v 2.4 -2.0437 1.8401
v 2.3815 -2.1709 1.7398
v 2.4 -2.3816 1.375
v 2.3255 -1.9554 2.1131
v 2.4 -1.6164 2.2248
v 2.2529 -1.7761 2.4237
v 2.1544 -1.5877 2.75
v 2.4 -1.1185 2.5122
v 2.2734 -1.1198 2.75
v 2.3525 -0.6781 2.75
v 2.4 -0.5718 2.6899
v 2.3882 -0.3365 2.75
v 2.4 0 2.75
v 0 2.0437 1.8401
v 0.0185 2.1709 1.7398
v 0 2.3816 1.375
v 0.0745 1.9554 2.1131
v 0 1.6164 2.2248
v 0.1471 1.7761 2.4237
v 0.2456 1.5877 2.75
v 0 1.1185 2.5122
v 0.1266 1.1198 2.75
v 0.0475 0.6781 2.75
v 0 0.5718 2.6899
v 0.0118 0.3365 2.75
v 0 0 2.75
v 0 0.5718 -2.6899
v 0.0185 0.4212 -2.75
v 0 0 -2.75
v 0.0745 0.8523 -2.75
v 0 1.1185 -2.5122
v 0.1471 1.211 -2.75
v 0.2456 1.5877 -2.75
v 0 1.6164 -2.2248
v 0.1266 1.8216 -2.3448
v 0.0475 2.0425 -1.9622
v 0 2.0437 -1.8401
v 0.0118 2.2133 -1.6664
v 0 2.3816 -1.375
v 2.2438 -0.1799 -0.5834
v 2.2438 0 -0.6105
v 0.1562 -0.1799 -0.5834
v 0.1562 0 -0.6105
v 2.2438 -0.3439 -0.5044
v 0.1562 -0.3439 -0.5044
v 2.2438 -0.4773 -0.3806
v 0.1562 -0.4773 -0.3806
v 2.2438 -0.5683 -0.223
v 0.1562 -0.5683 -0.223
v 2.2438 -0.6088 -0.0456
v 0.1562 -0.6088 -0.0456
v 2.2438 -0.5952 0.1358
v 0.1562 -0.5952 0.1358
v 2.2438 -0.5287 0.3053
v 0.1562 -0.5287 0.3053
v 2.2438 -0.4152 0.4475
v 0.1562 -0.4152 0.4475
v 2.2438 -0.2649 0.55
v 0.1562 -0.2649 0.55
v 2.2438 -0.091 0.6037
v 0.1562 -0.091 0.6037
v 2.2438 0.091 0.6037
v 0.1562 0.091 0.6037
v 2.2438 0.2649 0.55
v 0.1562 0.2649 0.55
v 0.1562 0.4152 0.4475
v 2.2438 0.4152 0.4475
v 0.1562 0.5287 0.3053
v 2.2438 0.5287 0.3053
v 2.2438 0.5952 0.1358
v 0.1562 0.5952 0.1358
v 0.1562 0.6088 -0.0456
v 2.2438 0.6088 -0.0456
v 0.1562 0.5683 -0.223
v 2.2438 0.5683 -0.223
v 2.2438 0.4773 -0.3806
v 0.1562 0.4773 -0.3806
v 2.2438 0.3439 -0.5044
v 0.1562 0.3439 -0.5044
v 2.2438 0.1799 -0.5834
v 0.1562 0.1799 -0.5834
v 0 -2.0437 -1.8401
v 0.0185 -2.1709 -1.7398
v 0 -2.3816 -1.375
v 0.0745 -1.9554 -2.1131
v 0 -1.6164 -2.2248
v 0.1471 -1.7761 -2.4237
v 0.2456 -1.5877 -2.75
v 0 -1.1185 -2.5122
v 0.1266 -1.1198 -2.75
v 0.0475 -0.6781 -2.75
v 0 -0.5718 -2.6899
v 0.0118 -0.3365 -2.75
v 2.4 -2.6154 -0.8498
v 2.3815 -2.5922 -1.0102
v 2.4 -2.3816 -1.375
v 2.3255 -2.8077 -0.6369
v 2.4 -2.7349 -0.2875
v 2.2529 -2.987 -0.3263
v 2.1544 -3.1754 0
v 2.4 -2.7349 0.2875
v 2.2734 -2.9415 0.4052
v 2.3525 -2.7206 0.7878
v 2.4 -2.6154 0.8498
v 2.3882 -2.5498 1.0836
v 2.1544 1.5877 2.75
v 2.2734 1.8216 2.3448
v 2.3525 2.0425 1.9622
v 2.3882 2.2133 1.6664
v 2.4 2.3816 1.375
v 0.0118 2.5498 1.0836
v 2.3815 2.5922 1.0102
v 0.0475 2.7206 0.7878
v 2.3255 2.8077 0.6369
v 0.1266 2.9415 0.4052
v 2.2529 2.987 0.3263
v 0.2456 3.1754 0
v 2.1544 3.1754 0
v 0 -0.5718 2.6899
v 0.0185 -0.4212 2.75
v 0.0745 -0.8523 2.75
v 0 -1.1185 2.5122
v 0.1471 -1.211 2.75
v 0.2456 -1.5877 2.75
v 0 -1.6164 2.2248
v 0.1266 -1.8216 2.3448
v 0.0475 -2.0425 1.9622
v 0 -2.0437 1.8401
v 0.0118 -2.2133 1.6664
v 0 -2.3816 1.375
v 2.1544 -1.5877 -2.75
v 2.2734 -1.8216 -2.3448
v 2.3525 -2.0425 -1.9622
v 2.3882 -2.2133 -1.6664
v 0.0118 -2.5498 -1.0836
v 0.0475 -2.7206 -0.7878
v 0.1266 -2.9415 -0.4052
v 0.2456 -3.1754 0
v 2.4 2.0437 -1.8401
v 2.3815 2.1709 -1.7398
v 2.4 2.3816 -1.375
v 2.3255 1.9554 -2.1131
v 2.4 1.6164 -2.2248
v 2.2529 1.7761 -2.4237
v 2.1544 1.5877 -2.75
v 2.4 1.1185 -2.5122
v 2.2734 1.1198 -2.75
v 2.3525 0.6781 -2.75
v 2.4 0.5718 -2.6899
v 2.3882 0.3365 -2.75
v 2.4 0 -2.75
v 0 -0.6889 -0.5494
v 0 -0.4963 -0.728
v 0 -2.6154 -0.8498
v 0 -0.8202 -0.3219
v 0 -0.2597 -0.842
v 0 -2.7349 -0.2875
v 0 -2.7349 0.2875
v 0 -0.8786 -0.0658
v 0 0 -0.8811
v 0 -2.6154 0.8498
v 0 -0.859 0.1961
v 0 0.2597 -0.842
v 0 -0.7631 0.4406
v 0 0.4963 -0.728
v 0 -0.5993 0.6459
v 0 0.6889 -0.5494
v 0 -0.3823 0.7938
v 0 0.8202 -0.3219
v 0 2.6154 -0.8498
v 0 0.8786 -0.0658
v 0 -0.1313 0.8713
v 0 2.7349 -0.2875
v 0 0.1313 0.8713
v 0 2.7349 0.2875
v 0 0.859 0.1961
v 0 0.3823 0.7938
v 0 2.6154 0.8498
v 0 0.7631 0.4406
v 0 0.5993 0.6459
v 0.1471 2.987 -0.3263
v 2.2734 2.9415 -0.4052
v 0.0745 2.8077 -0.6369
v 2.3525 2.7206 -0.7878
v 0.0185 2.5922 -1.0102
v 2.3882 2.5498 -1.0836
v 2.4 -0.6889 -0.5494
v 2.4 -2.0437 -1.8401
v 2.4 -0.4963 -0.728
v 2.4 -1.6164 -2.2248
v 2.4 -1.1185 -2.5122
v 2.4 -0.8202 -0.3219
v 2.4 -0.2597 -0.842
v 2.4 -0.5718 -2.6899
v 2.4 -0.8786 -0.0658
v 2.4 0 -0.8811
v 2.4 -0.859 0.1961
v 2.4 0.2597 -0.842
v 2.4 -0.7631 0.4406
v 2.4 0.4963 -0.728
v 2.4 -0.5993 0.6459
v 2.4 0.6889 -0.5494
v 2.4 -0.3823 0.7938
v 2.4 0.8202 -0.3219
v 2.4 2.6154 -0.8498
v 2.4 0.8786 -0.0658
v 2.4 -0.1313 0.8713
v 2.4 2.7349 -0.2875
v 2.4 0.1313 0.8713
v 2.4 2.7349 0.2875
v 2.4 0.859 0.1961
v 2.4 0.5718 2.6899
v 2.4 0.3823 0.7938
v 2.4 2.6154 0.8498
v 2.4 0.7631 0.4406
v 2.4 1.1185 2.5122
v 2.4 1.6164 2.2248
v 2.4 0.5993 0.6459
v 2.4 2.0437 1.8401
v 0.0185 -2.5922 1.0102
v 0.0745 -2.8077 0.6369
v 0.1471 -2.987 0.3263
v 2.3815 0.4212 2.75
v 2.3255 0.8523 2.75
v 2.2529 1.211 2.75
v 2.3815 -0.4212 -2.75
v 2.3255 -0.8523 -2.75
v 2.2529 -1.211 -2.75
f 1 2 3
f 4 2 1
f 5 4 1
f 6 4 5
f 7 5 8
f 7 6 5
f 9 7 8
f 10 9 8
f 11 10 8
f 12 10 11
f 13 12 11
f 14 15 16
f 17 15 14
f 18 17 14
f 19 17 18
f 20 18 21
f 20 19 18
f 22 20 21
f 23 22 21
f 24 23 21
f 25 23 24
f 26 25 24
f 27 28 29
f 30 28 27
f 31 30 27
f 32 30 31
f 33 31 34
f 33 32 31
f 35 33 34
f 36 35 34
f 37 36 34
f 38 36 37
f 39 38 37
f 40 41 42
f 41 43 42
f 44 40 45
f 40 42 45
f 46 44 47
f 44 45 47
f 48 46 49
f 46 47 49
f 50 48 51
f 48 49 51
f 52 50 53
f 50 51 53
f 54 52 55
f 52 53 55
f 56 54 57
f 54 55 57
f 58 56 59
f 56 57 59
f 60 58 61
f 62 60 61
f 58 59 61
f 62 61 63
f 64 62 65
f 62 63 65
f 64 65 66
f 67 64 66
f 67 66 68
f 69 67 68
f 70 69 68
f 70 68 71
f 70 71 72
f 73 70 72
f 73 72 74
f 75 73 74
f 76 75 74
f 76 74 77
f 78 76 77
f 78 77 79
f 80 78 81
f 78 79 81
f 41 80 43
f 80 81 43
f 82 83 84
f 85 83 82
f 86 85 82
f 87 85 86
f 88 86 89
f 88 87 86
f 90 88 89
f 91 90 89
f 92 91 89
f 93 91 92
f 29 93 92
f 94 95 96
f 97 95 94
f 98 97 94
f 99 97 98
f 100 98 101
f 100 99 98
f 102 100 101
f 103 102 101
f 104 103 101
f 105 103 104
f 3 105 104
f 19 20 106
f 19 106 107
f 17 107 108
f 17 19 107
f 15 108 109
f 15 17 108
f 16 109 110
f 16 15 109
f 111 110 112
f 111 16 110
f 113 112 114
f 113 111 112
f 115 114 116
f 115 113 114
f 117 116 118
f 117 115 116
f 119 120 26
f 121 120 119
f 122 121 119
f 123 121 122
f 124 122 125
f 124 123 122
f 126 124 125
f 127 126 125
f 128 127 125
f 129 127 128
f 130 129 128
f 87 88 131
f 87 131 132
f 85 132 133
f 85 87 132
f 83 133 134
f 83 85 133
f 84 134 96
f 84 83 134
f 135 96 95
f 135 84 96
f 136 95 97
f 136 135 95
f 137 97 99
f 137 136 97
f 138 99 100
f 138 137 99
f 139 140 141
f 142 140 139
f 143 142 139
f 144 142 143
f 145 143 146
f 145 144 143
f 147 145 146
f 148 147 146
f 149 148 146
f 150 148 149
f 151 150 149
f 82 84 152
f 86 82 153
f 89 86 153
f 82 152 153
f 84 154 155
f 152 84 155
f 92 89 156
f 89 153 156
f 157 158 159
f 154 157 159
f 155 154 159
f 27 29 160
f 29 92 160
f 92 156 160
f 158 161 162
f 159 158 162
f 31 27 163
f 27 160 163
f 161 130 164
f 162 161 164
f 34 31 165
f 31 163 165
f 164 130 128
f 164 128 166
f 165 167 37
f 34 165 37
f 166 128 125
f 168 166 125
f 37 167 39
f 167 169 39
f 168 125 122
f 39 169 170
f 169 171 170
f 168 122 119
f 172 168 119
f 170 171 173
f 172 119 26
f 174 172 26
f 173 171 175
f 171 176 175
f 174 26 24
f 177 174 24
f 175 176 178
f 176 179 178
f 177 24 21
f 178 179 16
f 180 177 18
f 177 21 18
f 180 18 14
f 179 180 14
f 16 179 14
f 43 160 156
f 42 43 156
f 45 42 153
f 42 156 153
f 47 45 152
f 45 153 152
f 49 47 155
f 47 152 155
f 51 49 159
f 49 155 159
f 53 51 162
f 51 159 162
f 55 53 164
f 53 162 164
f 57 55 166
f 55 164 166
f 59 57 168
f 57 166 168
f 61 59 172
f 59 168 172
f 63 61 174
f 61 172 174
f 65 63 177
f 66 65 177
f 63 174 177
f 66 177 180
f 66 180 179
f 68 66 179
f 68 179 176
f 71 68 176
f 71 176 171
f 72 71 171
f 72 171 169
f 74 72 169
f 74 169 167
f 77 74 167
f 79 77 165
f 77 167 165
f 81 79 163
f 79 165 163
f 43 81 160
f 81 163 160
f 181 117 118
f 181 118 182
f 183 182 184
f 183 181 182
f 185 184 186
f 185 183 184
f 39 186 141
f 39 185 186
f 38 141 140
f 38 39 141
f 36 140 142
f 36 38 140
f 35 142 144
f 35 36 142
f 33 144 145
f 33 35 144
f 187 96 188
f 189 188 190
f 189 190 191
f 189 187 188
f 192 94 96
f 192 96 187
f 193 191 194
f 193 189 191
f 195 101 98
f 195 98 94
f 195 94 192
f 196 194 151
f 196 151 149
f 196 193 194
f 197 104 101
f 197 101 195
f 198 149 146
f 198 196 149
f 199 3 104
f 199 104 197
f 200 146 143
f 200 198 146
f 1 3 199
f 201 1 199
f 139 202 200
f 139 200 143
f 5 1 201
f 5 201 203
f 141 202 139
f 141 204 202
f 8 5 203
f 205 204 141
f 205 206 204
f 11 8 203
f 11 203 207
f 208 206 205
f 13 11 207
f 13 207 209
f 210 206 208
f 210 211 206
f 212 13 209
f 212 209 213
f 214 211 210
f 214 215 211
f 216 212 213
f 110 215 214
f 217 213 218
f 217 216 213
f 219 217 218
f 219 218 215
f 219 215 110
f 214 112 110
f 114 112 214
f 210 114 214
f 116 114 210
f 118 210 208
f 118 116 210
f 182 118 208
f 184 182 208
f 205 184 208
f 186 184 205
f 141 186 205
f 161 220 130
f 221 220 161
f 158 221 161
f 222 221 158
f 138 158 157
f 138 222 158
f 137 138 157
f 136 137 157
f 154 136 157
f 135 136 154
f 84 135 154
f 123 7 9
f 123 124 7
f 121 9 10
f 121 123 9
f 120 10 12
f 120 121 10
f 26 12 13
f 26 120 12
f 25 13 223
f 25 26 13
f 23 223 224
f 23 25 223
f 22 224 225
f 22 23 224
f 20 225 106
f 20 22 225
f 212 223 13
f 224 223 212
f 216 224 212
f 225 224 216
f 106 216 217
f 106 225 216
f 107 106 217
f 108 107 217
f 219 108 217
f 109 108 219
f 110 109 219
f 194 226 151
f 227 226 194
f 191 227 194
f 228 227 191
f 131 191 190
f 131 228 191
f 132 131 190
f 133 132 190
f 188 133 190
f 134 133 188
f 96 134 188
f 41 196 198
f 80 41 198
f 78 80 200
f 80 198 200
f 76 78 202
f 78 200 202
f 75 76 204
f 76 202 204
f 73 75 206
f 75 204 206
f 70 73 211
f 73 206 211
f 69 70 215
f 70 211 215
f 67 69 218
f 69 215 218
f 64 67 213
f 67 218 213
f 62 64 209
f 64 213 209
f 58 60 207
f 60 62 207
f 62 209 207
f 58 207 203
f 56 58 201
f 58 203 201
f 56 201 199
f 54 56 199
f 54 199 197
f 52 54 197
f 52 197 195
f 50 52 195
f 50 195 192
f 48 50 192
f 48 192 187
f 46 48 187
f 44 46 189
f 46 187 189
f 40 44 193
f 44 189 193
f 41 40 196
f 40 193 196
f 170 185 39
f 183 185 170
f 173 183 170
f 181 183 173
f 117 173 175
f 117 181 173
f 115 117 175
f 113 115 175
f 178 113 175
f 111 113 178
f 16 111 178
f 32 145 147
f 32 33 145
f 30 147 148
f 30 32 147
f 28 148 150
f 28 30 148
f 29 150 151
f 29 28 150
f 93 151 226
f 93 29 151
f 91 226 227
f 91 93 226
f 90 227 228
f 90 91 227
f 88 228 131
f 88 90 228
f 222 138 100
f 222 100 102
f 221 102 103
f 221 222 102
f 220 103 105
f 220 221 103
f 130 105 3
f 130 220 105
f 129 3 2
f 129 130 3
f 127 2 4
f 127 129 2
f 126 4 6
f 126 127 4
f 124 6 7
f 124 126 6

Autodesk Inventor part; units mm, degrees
ref_plane "YZ Plane" through (0, 0, 0) normal (1, 0, 0) x (0, 1, 0)
ref_plane "XZ Plane" through (0, 0, 0) normal (0, 1, 0) x (-1, 0, 0)
sketch "Sketch1" plane through (0, 0, 0) normal (1, 0, 0) x (0, 1, 0)
  line L0 (-3.1754, 0) -> (-1.5877, 2.75)
  line L1 (-1.5877, 2.75) -> (1.5877, 2.75)
  line L2 (1.5877, 2.75) -> (3.1754, 0)
  line L3 (3.1754, 0) -> (1.5877, -2.75)
  line L4 (1.5877, -2.75) -> (-1.5877, -2.75)
  line L5 (-1.5877, -2.75) -> (-3.1754, 0)
  point P0 (0, 0)
  point P1 (0, 0)
  dimension "d0" = 6.3509
extrude "Body" add sketch "Sketch1" along normal blind 2.4
sketch "Sketch2" plane through (0, 0, 0) normal (0, 0, 1) x (1, 0, 0)
  line L0 (0, 1.5877) -> (0, 3.1754) projected
  line L1 (0, 3.1754) -> (2.4, 3.1754) projected
  line L2 (2.4, 1.5877) -> (2.4, 3.1754) projected
  line L3 (-0.16, 0) -> (0.96, 0) projected
  line L4 (0.2456, 3.1754) -> (0, 2.75)
  line L5 (2.1544, 3.1754) -> (2.4, 2.75)
  dimension "d3" = 30
  dimension "d4" = 30
  dimension "d5" = 5.5
  dimension "d6" = 5.5
revolve "Chamfer1" cut sketch "Sketch2" angle 360 about axis through (-10, 0, 0) along (1, 0, 0)
sketch "Sketch3" plane through (2.4, 0, 0) normal (1, 0, 0) x (0, 0, -1)
  arc A0 (-1.375, -2.3816) -> (1.375, -2.3816) centre (0, 0) ccw projected
hole "Thread" at (2.4, 0, 0) direction (-1, 0, 0) diameter 1.221 end through all thread size "M1.6x0.35" class "6H" standard "ANSI Metric M Profile"
chamfer "Chamfer2" distance 0.2706 angle 30 1 edges at (2.4, 0, 0.6105) measured on face at (2.4, -2.0253, -0.0245)
chamfer "Chamfer3" distance 0.2706 angle 30 1 edges at (0, 0, 0.6105) measured on face at (0, -2.0253, -0.0245)
ref_plane "Work Plane1" through (-6.3375, 0, 0) normal (0, -0.8660254, -0.5) x (1, 0, 0)
equation "\"d0\" = 1.1547 * SW"
equation "\"d1\" = KOH"
equation "\"d3\" = ANG1"
equation "\"d4\" = ANG2"
equation "\"d5\" = SW0"
equation "\"d6\" = SW01"
equation "\"d8\" = -0.5 * GD1 + 0.5 * NND"
equation "\"d40\" = -0.5 * GD1 + 0.5 * NND"
equation "\"d10\" = -0.5 * GD1 + 0.5 * NND"
equation "\"d41\" = -0.5 * GD1 + 0.5 * NND"
equation "\"ANG1\" = 30deg"
equation "\"ANG2\" = 30deg"
equation "\"NND\" = 3"
equation "\"KOH\" = 2.4"
equation "\"SW\" = 5.5"
equation "\"SW0\" = SW"
equation "\"SW01\" = SW"
equation "\"GUL\" = 0.541266 * PTC"
equation "\"WFT\" = 0.4"
equation "\"THREADDIA\" = 3"
equation "\"TOA\" = 30deg"
equation "\"PTC\" = 0.5"
equation "\"E0\" = 1.155 * SW"
equation "\"GAL\" = 0.541266 * PTC"
equation "\"GD1\" = 2.458734"
properties part number "AS 1112 - M3  Type 5" material "Steel, Mild"
